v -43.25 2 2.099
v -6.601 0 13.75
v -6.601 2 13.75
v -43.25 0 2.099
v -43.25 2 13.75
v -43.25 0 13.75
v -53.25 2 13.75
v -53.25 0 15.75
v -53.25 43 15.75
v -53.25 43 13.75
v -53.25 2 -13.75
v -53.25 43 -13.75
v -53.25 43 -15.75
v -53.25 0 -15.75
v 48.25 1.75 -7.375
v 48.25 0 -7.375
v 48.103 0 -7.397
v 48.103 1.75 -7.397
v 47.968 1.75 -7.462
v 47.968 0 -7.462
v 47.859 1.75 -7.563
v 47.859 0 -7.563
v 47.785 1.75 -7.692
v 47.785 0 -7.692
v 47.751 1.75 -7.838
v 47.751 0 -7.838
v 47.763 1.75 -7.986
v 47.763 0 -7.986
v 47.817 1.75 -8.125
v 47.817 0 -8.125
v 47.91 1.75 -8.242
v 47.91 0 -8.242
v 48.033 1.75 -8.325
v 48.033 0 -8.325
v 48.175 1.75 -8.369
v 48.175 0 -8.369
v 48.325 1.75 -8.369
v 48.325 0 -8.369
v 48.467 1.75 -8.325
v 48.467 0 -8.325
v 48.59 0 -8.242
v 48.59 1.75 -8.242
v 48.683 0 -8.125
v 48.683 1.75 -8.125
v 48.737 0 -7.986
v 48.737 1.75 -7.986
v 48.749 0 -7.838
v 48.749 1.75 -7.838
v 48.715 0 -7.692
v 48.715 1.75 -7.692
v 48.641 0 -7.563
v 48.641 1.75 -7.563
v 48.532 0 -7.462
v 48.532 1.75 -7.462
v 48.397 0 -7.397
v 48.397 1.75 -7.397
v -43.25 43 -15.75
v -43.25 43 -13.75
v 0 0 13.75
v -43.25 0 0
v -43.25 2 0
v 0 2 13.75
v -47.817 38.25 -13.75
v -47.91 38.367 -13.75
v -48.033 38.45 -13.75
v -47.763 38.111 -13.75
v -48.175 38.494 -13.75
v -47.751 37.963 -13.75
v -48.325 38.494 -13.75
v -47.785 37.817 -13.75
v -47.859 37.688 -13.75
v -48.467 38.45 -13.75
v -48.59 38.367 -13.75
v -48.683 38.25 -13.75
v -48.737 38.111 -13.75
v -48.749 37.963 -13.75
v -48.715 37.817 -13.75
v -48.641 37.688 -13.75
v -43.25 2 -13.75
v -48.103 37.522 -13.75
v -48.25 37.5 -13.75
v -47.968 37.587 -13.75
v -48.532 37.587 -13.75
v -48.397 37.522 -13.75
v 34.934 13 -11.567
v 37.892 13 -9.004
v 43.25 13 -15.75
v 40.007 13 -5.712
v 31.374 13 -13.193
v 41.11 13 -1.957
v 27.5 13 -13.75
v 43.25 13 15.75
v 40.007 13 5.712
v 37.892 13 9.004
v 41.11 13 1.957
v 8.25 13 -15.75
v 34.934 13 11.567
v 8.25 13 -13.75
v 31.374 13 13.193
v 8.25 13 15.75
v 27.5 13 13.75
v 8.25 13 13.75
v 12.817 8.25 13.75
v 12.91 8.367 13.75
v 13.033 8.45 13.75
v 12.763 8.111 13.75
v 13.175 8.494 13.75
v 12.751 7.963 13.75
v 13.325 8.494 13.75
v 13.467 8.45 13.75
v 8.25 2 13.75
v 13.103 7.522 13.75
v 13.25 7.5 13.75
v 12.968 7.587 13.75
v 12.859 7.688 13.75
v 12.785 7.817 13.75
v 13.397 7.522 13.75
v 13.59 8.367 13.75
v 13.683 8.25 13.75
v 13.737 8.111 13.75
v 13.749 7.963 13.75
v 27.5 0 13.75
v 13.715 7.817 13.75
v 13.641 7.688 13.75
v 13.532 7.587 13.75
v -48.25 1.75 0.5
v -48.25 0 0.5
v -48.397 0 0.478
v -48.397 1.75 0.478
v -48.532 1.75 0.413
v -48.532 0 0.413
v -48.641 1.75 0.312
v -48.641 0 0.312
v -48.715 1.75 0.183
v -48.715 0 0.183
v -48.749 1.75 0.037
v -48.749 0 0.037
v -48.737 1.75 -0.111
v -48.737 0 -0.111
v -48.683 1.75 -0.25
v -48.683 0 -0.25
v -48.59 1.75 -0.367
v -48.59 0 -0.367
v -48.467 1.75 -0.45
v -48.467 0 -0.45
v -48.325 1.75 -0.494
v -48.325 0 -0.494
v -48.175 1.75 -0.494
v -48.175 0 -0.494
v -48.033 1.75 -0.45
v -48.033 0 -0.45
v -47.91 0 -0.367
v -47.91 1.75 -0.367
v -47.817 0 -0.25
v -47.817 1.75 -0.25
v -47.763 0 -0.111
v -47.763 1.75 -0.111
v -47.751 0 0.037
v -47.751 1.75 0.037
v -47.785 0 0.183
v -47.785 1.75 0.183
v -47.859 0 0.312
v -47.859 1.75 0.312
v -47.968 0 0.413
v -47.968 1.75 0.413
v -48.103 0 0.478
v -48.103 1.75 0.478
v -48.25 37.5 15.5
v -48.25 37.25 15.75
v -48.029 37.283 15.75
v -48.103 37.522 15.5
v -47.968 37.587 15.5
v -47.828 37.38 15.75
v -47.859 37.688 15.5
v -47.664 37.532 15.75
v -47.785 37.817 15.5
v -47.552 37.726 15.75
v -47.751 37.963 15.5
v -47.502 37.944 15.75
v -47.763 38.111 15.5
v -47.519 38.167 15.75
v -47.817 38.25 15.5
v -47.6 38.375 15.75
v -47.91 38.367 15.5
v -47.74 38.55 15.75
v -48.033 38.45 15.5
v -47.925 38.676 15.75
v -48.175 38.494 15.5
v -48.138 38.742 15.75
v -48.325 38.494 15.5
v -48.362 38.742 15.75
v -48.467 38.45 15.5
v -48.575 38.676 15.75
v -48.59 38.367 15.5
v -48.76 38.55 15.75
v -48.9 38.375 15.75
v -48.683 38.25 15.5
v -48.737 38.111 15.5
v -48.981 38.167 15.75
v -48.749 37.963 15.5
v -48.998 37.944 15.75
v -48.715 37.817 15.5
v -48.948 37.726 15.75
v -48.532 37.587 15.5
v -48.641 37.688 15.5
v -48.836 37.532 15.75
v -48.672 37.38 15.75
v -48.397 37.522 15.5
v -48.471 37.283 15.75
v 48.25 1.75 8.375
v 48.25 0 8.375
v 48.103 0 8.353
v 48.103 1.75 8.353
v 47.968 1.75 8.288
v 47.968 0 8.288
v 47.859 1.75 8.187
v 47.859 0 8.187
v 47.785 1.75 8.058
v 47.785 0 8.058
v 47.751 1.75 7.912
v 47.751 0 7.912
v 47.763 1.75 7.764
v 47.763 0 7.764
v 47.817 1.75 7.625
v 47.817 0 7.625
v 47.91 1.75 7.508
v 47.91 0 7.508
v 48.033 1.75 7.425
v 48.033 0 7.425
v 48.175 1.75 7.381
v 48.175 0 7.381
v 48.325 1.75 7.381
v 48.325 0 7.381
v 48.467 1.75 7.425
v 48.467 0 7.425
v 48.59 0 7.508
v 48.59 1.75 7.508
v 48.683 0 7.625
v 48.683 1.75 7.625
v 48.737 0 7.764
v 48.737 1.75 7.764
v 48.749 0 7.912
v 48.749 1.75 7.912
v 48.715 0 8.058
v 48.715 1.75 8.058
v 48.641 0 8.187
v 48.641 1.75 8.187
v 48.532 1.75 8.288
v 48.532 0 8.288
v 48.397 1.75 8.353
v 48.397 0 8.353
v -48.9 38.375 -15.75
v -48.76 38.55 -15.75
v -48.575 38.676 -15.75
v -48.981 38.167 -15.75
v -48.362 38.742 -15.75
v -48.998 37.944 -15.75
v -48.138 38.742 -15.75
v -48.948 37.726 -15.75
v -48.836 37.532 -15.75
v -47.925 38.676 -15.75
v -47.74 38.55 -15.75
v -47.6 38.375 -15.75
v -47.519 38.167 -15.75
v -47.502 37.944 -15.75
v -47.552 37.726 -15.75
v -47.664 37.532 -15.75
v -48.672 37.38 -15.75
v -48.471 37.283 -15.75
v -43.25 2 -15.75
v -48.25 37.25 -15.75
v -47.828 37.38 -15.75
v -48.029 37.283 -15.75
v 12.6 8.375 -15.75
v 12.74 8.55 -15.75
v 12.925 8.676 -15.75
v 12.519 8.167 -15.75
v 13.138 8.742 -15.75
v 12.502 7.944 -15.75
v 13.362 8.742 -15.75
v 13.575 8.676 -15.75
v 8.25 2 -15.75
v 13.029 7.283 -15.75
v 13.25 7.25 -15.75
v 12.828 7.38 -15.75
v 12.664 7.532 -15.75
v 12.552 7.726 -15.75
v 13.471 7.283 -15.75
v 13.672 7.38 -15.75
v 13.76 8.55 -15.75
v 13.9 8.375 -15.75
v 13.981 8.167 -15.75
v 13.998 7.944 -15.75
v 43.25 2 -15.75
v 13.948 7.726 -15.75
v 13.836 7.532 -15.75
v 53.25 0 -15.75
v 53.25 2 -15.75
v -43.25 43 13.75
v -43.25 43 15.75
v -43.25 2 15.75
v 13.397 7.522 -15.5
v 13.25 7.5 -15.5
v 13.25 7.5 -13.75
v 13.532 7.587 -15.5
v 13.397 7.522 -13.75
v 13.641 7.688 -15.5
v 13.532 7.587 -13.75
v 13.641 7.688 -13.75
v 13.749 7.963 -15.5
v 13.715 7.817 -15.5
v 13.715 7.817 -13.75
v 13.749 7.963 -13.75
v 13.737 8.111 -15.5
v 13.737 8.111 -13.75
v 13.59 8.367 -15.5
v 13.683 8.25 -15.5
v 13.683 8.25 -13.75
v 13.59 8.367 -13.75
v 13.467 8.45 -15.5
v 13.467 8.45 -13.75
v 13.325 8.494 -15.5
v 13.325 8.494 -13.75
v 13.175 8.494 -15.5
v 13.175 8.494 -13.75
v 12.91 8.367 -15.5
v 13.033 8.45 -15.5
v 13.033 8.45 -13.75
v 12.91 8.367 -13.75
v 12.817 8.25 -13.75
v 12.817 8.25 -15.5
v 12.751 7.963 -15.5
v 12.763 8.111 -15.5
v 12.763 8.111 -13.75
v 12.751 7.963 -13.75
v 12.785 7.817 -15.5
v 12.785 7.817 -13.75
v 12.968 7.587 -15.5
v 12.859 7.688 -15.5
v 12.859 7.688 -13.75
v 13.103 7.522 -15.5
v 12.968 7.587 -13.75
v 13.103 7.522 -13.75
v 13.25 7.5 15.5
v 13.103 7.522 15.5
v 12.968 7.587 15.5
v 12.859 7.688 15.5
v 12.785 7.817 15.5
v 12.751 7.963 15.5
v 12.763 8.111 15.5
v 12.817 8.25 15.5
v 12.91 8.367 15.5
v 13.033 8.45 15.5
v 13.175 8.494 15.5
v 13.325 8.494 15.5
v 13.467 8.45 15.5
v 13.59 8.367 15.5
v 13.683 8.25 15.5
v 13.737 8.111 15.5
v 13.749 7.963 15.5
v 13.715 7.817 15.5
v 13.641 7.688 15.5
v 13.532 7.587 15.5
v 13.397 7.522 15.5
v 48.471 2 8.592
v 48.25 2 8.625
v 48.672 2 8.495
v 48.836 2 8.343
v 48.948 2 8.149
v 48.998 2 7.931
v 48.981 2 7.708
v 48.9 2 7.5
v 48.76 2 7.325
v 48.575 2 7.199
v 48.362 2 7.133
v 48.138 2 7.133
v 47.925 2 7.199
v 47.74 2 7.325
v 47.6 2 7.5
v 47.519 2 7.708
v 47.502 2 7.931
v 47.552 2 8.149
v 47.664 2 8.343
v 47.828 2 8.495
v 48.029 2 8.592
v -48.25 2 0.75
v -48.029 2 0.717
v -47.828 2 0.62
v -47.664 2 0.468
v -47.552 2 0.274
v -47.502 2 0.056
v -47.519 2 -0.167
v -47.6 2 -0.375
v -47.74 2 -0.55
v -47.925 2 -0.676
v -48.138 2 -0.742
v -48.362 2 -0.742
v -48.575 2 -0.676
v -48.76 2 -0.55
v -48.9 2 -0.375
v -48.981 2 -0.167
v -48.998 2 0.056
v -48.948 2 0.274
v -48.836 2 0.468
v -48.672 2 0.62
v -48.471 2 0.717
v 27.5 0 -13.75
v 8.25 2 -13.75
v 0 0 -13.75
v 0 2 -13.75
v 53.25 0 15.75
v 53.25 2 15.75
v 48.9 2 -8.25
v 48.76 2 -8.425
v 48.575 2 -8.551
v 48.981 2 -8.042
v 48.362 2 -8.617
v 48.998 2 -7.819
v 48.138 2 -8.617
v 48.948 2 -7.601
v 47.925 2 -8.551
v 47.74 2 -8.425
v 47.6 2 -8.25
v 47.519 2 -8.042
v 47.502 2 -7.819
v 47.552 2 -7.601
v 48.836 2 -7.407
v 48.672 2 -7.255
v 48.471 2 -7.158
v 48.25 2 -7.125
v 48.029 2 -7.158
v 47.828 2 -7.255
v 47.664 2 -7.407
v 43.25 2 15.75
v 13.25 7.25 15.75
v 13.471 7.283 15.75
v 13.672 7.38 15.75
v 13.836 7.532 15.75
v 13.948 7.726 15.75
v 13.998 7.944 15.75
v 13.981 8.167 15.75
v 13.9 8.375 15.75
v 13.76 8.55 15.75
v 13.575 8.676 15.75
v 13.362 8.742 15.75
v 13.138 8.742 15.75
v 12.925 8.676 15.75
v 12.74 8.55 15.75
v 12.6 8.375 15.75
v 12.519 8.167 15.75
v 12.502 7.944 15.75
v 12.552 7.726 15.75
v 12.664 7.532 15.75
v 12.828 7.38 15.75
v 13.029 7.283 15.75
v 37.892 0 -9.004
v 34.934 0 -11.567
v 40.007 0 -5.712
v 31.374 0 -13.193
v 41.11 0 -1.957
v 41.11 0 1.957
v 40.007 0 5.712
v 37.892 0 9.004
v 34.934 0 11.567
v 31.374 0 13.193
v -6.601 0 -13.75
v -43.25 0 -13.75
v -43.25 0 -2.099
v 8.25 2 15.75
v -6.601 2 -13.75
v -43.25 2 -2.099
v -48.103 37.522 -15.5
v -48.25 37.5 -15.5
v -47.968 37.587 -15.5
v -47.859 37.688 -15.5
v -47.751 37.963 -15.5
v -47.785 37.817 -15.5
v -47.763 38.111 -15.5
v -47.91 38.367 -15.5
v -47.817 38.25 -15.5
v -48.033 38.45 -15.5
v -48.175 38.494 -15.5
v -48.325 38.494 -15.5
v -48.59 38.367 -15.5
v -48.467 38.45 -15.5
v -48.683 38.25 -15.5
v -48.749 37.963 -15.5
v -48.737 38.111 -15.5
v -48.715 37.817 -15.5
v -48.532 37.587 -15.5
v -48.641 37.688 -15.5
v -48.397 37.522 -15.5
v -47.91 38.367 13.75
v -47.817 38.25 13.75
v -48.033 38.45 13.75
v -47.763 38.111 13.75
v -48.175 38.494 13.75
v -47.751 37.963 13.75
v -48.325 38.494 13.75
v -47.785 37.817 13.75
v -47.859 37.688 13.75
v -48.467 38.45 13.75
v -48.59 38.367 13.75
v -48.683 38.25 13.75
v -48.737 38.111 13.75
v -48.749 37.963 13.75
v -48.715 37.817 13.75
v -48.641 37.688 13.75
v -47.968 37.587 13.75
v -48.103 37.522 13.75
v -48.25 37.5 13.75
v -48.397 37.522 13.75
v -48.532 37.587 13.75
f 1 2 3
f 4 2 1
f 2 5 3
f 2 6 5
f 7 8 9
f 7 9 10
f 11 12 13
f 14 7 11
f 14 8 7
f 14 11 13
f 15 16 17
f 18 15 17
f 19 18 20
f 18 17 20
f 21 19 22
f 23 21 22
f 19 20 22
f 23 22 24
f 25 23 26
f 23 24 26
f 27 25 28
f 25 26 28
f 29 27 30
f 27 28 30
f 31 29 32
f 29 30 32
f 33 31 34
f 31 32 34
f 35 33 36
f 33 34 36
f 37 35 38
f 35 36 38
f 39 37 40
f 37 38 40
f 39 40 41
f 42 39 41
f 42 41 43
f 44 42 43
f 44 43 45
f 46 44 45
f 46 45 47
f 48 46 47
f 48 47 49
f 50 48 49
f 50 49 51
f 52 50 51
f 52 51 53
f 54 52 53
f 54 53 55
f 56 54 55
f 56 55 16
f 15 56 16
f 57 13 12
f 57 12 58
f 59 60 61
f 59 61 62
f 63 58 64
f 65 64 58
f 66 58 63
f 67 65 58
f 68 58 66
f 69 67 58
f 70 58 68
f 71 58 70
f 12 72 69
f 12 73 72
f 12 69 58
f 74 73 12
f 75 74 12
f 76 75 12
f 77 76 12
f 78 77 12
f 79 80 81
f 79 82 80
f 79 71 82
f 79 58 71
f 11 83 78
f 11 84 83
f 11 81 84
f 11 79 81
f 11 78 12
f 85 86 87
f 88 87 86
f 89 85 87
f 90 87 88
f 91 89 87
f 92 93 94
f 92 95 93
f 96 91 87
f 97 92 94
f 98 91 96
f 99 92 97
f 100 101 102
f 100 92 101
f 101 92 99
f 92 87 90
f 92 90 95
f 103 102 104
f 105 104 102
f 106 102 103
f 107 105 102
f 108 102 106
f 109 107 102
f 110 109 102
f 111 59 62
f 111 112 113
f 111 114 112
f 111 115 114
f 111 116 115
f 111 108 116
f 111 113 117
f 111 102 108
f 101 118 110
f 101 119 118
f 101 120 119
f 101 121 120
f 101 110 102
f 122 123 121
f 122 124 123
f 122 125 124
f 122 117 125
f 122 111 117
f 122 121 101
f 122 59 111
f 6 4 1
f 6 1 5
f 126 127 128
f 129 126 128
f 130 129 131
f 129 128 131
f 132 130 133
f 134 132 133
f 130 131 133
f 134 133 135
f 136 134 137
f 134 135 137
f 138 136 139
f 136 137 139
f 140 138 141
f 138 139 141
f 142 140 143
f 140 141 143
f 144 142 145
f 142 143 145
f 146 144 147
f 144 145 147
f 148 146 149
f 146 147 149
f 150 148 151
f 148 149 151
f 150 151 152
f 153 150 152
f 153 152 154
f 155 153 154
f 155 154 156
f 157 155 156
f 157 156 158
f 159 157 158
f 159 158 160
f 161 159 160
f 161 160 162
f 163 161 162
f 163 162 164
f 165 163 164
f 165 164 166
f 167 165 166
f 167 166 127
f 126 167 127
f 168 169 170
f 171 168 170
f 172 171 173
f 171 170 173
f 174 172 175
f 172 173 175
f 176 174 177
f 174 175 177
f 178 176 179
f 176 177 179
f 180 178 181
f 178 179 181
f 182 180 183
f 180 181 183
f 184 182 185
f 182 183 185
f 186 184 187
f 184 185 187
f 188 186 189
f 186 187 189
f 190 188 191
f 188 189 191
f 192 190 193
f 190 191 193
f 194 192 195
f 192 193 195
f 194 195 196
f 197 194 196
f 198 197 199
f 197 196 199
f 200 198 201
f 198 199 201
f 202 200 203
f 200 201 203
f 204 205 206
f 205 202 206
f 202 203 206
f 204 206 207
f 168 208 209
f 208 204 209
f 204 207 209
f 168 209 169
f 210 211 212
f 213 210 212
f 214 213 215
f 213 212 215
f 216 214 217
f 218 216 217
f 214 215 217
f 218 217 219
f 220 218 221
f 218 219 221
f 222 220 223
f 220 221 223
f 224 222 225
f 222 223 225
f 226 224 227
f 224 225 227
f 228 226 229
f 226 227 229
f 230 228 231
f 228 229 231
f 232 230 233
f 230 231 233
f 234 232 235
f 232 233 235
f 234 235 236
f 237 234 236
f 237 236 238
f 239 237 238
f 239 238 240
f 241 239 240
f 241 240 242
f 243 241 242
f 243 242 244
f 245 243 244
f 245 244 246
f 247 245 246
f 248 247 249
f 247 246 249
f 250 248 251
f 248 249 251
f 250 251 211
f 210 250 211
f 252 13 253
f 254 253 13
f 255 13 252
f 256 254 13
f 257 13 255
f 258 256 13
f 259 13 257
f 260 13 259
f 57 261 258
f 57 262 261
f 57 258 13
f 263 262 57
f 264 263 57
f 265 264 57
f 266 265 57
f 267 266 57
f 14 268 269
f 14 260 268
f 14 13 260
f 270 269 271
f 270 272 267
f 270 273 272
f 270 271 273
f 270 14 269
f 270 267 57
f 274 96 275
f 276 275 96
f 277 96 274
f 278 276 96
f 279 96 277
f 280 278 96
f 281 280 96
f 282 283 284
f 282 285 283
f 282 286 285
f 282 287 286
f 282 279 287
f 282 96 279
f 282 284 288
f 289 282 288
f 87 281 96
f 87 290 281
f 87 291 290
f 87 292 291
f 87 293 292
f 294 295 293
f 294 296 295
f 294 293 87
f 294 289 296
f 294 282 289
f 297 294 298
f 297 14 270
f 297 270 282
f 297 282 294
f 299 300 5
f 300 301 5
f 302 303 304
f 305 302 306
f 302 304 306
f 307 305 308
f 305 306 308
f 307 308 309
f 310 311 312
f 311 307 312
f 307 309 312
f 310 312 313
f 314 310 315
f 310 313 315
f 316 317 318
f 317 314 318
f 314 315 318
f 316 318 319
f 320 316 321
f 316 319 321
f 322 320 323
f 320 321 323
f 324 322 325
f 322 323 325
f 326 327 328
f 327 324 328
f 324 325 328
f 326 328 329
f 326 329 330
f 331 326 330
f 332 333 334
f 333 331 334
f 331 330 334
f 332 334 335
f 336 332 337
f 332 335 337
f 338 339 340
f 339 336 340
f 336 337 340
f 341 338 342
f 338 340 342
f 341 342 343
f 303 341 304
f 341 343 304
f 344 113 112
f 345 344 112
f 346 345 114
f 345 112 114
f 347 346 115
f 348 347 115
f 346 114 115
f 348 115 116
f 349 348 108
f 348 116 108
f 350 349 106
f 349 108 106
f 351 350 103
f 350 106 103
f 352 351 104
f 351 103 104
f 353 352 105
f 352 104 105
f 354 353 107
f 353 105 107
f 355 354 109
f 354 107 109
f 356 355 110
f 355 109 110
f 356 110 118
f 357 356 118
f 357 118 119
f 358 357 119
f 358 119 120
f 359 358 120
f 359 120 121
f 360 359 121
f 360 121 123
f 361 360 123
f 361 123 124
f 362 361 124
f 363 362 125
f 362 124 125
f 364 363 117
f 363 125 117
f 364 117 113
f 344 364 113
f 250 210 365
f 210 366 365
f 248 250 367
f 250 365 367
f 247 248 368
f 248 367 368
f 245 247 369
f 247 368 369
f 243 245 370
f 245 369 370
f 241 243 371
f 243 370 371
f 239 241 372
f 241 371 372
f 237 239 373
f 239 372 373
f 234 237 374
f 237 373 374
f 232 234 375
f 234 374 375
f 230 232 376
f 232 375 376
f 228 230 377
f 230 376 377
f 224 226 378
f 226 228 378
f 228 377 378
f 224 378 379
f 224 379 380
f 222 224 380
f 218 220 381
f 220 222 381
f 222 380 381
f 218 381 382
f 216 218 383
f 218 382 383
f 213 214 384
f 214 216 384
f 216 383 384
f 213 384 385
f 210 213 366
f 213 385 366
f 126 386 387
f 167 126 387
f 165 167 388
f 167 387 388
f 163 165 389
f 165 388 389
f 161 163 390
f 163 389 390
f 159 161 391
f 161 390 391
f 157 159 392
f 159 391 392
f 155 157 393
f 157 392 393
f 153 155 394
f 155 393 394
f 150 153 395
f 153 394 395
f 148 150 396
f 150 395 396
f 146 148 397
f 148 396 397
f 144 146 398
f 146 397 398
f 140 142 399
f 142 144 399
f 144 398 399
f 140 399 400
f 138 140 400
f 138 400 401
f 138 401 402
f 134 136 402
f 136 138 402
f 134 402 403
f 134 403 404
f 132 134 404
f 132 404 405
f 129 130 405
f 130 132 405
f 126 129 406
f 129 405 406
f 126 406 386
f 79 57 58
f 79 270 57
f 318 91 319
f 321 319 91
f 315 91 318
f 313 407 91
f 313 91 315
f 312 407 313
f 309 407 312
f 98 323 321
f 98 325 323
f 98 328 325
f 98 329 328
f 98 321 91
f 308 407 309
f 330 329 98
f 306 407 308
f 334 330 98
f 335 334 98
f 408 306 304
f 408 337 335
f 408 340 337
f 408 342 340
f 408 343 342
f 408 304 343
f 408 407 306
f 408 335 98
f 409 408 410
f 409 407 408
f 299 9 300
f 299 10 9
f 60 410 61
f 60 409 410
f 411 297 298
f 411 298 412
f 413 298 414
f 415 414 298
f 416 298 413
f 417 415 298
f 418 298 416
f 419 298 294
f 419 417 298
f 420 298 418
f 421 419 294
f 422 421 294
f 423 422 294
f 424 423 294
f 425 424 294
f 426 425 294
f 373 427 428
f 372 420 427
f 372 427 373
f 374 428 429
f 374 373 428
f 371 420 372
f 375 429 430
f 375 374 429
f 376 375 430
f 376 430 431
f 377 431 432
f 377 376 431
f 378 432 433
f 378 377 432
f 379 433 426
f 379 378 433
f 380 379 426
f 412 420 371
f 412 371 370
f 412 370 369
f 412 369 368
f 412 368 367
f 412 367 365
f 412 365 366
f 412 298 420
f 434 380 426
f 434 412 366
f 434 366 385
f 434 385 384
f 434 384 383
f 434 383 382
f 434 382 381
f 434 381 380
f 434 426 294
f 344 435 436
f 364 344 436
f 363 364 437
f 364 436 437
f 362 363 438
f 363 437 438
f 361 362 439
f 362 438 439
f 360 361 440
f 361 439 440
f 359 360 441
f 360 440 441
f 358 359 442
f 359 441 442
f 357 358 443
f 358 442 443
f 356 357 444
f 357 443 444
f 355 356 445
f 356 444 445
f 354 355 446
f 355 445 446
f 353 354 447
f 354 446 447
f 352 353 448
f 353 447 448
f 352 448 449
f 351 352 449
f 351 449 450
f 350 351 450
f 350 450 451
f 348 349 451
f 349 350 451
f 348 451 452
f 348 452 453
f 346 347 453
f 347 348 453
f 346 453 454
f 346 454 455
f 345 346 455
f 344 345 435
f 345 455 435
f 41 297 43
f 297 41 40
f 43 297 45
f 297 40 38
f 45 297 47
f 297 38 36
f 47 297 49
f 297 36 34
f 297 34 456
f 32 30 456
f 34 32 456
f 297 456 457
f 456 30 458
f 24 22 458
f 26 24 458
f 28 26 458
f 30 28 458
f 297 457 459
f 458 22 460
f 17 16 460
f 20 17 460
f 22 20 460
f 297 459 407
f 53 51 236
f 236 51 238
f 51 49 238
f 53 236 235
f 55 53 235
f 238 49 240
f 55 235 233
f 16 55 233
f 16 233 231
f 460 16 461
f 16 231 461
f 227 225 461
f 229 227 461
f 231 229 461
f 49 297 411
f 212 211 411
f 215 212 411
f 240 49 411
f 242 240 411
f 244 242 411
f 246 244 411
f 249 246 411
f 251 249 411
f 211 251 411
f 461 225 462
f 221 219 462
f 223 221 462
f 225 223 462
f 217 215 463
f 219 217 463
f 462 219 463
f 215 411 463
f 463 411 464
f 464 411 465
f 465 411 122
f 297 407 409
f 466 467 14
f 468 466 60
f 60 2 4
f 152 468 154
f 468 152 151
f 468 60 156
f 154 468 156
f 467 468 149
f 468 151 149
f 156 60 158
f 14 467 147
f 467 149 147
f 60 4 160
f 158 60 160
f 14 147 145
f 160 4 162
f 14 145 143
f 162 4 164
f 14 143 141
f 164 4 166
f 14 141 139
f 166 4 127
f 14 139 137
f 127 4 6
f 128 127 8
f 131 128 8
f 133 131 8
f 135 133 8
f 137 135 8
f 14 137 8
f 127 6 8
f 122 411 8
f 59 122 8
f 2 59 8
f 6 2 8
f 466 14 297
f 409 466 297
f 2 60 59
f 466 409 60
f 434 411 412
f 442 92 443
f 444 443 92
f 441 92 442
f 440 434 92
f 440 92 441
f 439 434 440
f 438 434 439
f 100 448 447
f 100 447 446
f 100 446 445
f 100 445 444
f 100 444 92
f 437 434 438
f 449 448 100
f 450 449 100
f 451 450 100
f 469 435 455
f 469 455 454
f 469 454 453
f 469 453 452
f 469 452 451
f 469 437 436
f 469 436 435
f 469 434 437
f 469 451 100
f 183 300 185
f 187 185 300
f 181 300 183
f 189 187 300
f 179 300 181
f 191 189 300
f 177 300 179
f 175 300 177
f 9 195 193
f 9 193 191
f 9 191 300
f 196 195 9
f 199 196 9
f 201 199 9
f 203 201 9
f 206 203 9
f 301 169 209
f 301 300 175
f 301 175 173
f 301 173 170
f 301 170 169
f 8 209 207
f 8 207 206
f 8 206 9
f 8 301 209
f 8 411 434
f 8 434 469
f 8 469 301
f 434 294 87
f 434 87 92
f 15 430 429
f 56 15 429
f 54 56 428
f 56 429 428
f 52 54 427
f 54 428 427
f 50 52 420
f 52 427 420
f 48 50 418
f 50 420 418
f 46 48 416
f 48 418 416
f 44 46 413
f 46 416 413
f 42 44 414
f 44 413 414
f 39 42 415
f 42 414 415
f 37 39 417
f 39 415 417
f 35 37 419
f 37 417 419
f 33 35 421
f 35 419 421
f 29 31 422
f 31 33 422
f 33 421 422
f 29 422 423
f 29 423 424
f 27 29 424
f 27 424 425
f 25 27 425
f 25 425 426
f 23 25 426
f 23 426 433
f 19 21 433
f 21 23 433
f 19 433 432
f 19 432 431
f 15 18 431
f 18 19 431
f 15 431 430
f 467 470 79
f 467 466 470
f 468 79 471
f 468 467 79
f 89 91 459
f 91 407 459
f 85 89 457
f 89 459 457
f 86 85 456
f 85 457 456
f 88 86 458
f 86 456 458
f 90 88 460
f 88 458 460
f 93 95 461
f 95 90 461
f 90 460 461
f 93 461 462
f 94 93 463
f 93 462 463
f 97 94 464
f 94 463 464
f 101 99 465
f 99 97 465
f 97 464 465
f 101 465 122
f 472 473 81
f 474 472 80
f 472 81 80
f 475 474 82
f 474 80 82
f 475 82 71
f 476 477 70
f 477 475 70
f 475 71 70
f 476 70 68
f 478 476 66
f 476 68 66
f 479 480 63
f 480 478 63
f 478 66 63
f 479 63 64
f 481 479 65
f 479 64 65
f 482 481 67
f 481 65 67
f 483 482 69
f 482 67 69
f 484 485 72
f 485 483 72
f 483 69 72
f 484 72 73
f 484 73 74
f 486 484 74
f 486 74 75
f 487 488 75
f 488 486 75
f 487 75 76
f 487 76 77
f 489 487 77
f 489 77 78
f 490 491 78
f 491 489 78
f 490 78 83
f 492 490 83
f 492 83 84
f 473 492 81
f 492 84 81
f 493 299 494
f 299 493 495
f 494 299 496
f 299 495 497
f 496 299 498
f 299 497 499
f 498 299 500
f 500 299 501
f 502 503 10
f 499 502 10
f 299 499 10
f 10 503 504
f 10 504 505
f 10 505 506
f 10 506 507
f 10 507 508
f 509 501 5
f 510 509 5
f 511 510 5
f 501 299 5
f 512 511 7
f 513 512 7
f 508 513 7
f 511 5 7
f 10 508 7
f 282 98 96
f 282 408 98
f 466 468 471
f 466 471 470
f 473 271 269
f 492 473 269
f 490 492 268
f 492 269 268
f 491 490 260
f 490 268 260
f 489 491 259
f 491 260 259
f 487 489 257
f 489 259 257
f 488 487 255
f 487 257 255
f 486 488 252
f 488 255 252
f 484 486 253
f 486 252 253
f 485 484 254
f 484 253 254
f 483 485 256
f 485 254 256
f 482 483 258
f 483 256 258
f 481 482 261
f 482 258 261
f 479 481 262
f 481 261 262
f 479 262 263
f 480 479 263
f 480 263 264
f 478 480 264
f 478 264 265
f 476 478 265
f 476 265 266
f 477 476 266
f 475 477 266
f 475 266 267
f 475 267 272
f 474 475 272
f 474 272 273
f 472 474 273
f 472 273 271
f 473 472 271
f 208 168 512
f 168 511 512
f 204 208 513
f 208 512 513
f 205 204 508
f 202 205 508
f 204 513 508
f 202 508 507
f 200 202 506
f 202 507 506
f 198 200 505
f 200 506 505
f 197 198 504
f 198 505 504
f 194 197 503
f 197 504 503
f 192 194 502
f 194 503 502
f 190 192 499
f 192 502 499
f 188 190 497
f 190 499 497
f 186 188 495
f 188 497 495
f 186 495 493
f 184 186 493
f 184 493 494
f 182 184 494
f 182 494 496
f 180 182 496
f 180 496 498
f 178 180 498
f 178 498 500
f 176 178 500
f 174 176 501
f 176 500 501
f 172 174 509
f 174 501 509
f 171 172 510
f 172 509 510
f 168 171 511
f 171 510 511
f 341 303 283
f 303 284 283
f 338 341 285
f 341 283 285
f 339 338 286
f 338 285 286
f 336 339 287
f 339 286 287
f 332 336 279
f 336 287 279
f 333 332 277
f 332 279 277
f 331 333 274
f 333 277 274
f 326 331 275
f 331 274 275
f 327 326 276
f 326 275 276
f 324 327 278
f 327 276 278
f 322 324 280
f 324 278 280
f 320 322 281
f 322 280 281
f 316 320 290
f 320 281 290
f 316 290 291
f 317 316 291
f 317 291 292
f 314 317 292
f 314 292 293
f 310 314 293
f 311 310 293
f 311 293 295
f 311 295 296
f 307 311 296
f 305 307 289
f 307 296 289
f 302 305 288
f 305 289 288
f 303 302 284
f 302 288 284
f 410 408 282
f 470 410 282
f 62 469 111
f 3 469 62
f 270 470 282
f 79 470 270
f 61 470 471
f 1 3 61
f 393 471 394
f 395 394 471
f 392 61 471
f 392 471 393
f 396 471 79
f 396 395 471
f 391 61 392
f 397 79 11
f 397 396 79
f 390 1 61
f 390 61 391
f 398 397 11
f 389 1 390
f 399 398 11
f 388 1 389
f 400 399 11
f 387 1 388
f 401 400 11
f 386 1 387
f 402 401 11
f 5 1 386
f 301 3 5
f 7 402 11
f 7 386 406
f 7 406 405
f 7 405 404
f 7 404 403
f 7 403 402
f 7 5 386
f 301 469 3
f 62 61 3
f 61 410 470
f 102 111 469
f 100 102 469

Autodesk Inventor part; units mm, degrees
ref_plane "YZ Plane" through (0, 0, 0) normal (1, 0, 0) x (0, 1, 0)
ref_plane "XZ Plane" through (0, 0, 0) normal (0, 1, 0) x (-1, 0, 0)
ref_plane "XY Plane" through (0, 0, 0) normal (0, 0, 1) x (1, 0, 0)
sketch "Эскиз1" plane through (0, 0, 0) normal (0, 1, 0) x (-1, 0, 0)
  line L0 (-53.25, 15.75) -> (53.25, 15.75)
  line L1 (53.25, 15.75) -> (53.25, -15.75)
  line L2 (53.25, -15.75) -> (-53.25, -15.75)
  line L3 (-53.25, -15.75) -> (-53.25, 15.75)
  line L4 (-53.25, 15.75) -> (53.25, -15.75) construction
  line L5 (53.25, 15.75) -> (-53.25, -15.75) construction
  line L6 (-43.25, -13.75) -> (0, -13.75)
  line L7 (43.25, -13.75) -> (43.25, -2.0986)
  line L8 (43.25, 13.75) -> (6.6012, 13.75)
  line L9 (-43.25, 13.75) -> (-43.25, -13.75)
  line L10 (0, -22.05) -> (0, 22.05) construction
  line L11 (0, -15.75) -> (0, -13.75) construction
  line L12 (0, 13.75) -> (0, 15.75) construction
  line L13 (0, -13.75) -> (43.25, 0)
  line L14 (43.25, 0) -> (0, 13.75)
  line L15 (6.6012, 13.75) -> (43.25, 2.0986)
  line L16 (43.25, -2.0986) -> (6.6012, -13.75)
  line L17 (43.25, -2.0986) -> (43.25, 2.0986) construction
  line L18 (43.25, 2.0986) -> (43.25, 13.75)
  line L19 (6.6012, -13.75) -> (43.25, -13.75)
  line L20 (0, -13.75) -> (6.6012, -13.75) construction
  line L21 (6.6012, 13.75) -> (0, 13.75) construction
  line L22 (0, 13.75) -> (-43.25, 13.75)
  line L23 (43.25, -2.0986) -> (42.644, -0.1926) construction
  line L24 (43.25, 2.0986) -> (42.644, 0.1926) construction
  point P0 (0, 0)
  point P1 (0, 0)
  dimension "d0" = 106.5
  dimension "d5" = 10
  dimension "d24" = 27.5
  dimension "d28" = 10
  dimension "d29" = 2
extrude "Выдавливание1" add sketch "Эскиз1" along normal blind 2
sketch "Эскиз2" plane through (0, 0, 0) normal (0, 1, 0) x (-1, 0, 0)
  line L0 (-43.25, -15.75) -> (-43.25, 15.75)
  line L1 (53.25, 15.75) -> (-53.25, 15.75) projected
  line L2 (-53.25, 15.75) -> (-53.25, -15.75) projected
  line L3 (0, -13.75) -> (-43.25, -13.75) construction
  line L4 (-41.25, -13.75) -> (-41.25, 13.75) construction
  line L5 (6.6012, 13.75) -> (43.25, 13.75) construction
  line L6 (-41.25, -13.75) -> (-27.5, -13.75) construction
  line L7 (-8.25, -13.75) -> (-8.25, -15.75)
  line L8 (-53.25, -15.75) -> (53.25, -15.75) projected
  line L9 (-8.25, -15.75) -> (-43.25, -15.75)
  line L10 (-43.25, 15.75) -> (-8.25, 15.75)
  line L11 (-8.25, 13.75) -> (-27.5, 13.75)
  line L12 (-8.25, 13.75) -> (-8.25, 15.75)
  arc A0 (-27.5, 13.75) -> (-27.5, -13.75) centre (-27.5, 0) ccw
  line L13 (-27.5, -13.75) -> (-8.25, -13.75)
  line L14 (-27.5, 13.75) -> (-41.25, 13.75) construction
  line L15 (-43.25, -13.75) -> (-43.25, 13.75) projected
  point P0 (0, 0)
  point P1 (43.25, -13.75)
  point P2 (-43.25, -15.75)
  dimension "d13" = 2
  dimension "d14" = 33
extrude "Выдавливание2" add sketch "Эскиз2" along normal blind 13 contours L0 L1 L12 L11 A0 L13 L7 L8
sketch "Эскиз3" plane through (0, 2, 0) normal (0, 1, 0) x (1, 0, 0)
  line L0 (-43.25, 13.75) -> (-53.25, 13.75)
  line L1 (-53.25, 13.75) -> (-53.25, 15.75)
  line L2 (-53.25, 15.75) -> (-43.25, 15.75)
  line L3 (-43.25, 15.75) -> (-43.25, 13.75)
  line L4 (-53.25, 15.75) -> (-53.25, -15.75) construction
  line L5 (-53.25, -15.75) -> (-43.25, -15.75)
  line L6 (-43.25, -15.75) -> (-43.25, -13.75)
  line L7 (-43.25, -13.75) -> (-53.25, -13.75)
  line L8 (-53.25, -13.75) -> (-53.25, -15.75)
  point P0 (0, 0)
  point P1 (8.25, -13.75)
extrude "Выдавливание3" add sketch "Эскиз3" along normal blind 41
sketch "Эскиз4" plane through (-53.25, 0, 15.75) normal (0, 0, 1) x (1, 0, 0)
  line L0 (10, 43) -> (0, 43) construction
  line L1 (0, 43) -> (10, 43) construction
  line L2 (10, 43) -> (10, 33) construction
  line L3 (10, 33) -> (0, 33) construction
  line L4 (0, 33) -> (0, 43) construction
  line L5 (106.5, 0) -> (0, 0) construction
  line L6 (0, 0) -> (0, 43) construction
  line L7 (10, 43) -> (10, 2) construction
  line L8 (10, 2) -> (61.5, 2) construction
  line L9 (61.5, 2) -> (61.5, 13) construction
  line L10 (61.5, 13) -> (96.5, 13) construction
  line L11 (96.5, 13) -> (96.5, 2) construction
  line L12 (96.5, 2) -> (106.5, 2) construction
  line L13 (106.5, 2) -> (106.5, 0) construction
  line L14 (10, 2) -> (10, 43) construction
  line L15 (0, 0) -> (0, 43) construction
  line L16 (10, 33) -> (0, 43) construction
  line L17 (10, 43) -> (0, 33) construction
  circle A0 centre (5, 38) radius 0.5
  line L18 (61.5, 13) -> (71.5, 13) construction
  line L19 (71.5, 13) -> (71.5, 3) construction
  line L20 (71.5, 3) -> (61.5, 3) construction
  line L21 (61.5, 3) -> (61.5, 13) construction
  line L22 (71.5, 13) -> (61.5, 3) construction
  line L23 (61.5, 2) -> (61.5, 13) construction
  line L24 (61.5, 13) -> (71.5, 3) construction
  circle A1 centre (66.5, 8) radius 0.5
  line L25 (0, 43) -> (10, 43) projected
  point P0 (53.25, 0)
  dimension "d19" = 1
  dimension "d20" = 10
  dimension "d21" = 1
hole "Отверстие1" at (-48.25, 38, 15.75) at (13.25, 8, 15.75) direction (0, 0, -1) diameter 1 depth 15.75 countersink diameter 1.5 countersink angle 90
mirror "Зеркальное отражение1" about plane through (0, 0, 0) normal (0, 0, 1) of "Отверстие1"
sketch "Эскиз5" plane through (0, 2, 0) normal (0, 1, 0) x (1, 0, 0)
  line L0 (8.25, 13.75) -> (8.25, 15.75) construction
  line L1 (-43.25, 15.75) -> (8.25, 15.75) construction
  line L2 (-53.25, 15.75) -> (-43.25, 15.75) construction
  line L3 (-53.25, 13.75) -> (-53.25, 15.75) construction
  line L4 (-43.25, 13.75) -> (-53.25, 13.75) construction
  line L5 (-43.25, 13.75) -> (-43.25, 2.0986) construction
  line L6 (-43.25, 2.0986) -> (-6.6012, 13.75) construction
  line L7 (-6.6012, 13.75) -> (-43.25, 13.75) construction
  line L8 (8.25, 13.75) -> (0, 13.75) construction
  line L9 (27.5, 13.75) -> (8.25, 13.75) construction
  arc A0 (27.5, -13.75) -> (27.5, 13.75) centre (27.5, 0) ccw construction
  line L10 (8.25, -13.75) -> (27.5, -13.75) construction
  line L11 (8.25, -15.75) -> (8.25, -13.75) construction
  line L12 (8.25, -15.75) -> (-43.25, -15.75) construction
  line L13 (-43.25, -13.75) -> (-43.25, -15.75) construction
  line L14 (-43.25, -13.75) -> (-6.6012, -13.75) construction
  line L15 (-6.6012, -13.75) -> (-43.25, -2.0986) construction
  line L16 (-43.25, -2.0986) -> (-43.25, -13.75) construction
  line L17 (8.25, 15.75) -> (43.25, 15.75) construction
  line L18 (43.25, 15.75) -> (43.25, -15.75) construction
  line L19 (53.25, -15.75) -> (43.25, -15.75) construction
  line L20 (53.25, 15.75) -> (53.25, -15.75) construction
  line L21 (43.25, 15.75) -> (53.25, 15.75) construction
  line L22 (-43.25, 15.75) -> (-43.25, 13.75) construction
  line L23 (-53.25, -13.75) -> (-53.25, 13.75) construction
  line L24 (-53.25, -15.75) -> (-53.25, -13.75) construction
  line L25 (-43.25, -15.75) -> (-53.25, -15.75) construction
  line L26 (0, 13.75) -> (-43.25, 0) construction
  line L27 (-43.25, 0) -> (0, -13.75) construction
  line L28 (0, -13.75) -> (8.25, -13.75) construction
  line L29 (43.25, -15.75) -> (8.25, -15.75) construction
  line L30 (-53.25, -13.75) -> (-43.25, -13.75) construction
  line L31 (53.25, 15.75) -> (-53.25, 15.75) construction
  line L32 (-53.25, 15.75) -> (-43.25, -15.75) construction
  line L33 (-53.25, -15.75) -> (53.25, -15.75) construction
  line L34 (-53.25, -15.75) -> (-43.25, 15.75) construction
  line L35 (53.25, 15.75) -> (43.25, 0) construction
  line L36 (43.25, 15.75) -> (53.25, 0) construction
  line L37 (53.25, -15.75) -> (53.25, 15.75) construction
  line L38 (53.25, 0) -> (43.25, -15.75) construction
  line L39 (53.25, -15.75) -> (43.25, 0) construction
  circle A1 centre (-48.25, 0) radius 0.5
  circle A2 centre (48.25, 7.875) radius 0.5
  circle A3 centre (48.25, -7.875) radius 0.5
  point P0 (0, 0)
  dimension "d37" = 1
hole "Отверстие2" at (-48.25, 2, 0) at (48.25, 2, 7.875) at (48.25, 2, -7.875) direction (0, -1, 0) diameter 1 end through all countersink diameter 1.5 countersink angle 90
properties part number "frame"
